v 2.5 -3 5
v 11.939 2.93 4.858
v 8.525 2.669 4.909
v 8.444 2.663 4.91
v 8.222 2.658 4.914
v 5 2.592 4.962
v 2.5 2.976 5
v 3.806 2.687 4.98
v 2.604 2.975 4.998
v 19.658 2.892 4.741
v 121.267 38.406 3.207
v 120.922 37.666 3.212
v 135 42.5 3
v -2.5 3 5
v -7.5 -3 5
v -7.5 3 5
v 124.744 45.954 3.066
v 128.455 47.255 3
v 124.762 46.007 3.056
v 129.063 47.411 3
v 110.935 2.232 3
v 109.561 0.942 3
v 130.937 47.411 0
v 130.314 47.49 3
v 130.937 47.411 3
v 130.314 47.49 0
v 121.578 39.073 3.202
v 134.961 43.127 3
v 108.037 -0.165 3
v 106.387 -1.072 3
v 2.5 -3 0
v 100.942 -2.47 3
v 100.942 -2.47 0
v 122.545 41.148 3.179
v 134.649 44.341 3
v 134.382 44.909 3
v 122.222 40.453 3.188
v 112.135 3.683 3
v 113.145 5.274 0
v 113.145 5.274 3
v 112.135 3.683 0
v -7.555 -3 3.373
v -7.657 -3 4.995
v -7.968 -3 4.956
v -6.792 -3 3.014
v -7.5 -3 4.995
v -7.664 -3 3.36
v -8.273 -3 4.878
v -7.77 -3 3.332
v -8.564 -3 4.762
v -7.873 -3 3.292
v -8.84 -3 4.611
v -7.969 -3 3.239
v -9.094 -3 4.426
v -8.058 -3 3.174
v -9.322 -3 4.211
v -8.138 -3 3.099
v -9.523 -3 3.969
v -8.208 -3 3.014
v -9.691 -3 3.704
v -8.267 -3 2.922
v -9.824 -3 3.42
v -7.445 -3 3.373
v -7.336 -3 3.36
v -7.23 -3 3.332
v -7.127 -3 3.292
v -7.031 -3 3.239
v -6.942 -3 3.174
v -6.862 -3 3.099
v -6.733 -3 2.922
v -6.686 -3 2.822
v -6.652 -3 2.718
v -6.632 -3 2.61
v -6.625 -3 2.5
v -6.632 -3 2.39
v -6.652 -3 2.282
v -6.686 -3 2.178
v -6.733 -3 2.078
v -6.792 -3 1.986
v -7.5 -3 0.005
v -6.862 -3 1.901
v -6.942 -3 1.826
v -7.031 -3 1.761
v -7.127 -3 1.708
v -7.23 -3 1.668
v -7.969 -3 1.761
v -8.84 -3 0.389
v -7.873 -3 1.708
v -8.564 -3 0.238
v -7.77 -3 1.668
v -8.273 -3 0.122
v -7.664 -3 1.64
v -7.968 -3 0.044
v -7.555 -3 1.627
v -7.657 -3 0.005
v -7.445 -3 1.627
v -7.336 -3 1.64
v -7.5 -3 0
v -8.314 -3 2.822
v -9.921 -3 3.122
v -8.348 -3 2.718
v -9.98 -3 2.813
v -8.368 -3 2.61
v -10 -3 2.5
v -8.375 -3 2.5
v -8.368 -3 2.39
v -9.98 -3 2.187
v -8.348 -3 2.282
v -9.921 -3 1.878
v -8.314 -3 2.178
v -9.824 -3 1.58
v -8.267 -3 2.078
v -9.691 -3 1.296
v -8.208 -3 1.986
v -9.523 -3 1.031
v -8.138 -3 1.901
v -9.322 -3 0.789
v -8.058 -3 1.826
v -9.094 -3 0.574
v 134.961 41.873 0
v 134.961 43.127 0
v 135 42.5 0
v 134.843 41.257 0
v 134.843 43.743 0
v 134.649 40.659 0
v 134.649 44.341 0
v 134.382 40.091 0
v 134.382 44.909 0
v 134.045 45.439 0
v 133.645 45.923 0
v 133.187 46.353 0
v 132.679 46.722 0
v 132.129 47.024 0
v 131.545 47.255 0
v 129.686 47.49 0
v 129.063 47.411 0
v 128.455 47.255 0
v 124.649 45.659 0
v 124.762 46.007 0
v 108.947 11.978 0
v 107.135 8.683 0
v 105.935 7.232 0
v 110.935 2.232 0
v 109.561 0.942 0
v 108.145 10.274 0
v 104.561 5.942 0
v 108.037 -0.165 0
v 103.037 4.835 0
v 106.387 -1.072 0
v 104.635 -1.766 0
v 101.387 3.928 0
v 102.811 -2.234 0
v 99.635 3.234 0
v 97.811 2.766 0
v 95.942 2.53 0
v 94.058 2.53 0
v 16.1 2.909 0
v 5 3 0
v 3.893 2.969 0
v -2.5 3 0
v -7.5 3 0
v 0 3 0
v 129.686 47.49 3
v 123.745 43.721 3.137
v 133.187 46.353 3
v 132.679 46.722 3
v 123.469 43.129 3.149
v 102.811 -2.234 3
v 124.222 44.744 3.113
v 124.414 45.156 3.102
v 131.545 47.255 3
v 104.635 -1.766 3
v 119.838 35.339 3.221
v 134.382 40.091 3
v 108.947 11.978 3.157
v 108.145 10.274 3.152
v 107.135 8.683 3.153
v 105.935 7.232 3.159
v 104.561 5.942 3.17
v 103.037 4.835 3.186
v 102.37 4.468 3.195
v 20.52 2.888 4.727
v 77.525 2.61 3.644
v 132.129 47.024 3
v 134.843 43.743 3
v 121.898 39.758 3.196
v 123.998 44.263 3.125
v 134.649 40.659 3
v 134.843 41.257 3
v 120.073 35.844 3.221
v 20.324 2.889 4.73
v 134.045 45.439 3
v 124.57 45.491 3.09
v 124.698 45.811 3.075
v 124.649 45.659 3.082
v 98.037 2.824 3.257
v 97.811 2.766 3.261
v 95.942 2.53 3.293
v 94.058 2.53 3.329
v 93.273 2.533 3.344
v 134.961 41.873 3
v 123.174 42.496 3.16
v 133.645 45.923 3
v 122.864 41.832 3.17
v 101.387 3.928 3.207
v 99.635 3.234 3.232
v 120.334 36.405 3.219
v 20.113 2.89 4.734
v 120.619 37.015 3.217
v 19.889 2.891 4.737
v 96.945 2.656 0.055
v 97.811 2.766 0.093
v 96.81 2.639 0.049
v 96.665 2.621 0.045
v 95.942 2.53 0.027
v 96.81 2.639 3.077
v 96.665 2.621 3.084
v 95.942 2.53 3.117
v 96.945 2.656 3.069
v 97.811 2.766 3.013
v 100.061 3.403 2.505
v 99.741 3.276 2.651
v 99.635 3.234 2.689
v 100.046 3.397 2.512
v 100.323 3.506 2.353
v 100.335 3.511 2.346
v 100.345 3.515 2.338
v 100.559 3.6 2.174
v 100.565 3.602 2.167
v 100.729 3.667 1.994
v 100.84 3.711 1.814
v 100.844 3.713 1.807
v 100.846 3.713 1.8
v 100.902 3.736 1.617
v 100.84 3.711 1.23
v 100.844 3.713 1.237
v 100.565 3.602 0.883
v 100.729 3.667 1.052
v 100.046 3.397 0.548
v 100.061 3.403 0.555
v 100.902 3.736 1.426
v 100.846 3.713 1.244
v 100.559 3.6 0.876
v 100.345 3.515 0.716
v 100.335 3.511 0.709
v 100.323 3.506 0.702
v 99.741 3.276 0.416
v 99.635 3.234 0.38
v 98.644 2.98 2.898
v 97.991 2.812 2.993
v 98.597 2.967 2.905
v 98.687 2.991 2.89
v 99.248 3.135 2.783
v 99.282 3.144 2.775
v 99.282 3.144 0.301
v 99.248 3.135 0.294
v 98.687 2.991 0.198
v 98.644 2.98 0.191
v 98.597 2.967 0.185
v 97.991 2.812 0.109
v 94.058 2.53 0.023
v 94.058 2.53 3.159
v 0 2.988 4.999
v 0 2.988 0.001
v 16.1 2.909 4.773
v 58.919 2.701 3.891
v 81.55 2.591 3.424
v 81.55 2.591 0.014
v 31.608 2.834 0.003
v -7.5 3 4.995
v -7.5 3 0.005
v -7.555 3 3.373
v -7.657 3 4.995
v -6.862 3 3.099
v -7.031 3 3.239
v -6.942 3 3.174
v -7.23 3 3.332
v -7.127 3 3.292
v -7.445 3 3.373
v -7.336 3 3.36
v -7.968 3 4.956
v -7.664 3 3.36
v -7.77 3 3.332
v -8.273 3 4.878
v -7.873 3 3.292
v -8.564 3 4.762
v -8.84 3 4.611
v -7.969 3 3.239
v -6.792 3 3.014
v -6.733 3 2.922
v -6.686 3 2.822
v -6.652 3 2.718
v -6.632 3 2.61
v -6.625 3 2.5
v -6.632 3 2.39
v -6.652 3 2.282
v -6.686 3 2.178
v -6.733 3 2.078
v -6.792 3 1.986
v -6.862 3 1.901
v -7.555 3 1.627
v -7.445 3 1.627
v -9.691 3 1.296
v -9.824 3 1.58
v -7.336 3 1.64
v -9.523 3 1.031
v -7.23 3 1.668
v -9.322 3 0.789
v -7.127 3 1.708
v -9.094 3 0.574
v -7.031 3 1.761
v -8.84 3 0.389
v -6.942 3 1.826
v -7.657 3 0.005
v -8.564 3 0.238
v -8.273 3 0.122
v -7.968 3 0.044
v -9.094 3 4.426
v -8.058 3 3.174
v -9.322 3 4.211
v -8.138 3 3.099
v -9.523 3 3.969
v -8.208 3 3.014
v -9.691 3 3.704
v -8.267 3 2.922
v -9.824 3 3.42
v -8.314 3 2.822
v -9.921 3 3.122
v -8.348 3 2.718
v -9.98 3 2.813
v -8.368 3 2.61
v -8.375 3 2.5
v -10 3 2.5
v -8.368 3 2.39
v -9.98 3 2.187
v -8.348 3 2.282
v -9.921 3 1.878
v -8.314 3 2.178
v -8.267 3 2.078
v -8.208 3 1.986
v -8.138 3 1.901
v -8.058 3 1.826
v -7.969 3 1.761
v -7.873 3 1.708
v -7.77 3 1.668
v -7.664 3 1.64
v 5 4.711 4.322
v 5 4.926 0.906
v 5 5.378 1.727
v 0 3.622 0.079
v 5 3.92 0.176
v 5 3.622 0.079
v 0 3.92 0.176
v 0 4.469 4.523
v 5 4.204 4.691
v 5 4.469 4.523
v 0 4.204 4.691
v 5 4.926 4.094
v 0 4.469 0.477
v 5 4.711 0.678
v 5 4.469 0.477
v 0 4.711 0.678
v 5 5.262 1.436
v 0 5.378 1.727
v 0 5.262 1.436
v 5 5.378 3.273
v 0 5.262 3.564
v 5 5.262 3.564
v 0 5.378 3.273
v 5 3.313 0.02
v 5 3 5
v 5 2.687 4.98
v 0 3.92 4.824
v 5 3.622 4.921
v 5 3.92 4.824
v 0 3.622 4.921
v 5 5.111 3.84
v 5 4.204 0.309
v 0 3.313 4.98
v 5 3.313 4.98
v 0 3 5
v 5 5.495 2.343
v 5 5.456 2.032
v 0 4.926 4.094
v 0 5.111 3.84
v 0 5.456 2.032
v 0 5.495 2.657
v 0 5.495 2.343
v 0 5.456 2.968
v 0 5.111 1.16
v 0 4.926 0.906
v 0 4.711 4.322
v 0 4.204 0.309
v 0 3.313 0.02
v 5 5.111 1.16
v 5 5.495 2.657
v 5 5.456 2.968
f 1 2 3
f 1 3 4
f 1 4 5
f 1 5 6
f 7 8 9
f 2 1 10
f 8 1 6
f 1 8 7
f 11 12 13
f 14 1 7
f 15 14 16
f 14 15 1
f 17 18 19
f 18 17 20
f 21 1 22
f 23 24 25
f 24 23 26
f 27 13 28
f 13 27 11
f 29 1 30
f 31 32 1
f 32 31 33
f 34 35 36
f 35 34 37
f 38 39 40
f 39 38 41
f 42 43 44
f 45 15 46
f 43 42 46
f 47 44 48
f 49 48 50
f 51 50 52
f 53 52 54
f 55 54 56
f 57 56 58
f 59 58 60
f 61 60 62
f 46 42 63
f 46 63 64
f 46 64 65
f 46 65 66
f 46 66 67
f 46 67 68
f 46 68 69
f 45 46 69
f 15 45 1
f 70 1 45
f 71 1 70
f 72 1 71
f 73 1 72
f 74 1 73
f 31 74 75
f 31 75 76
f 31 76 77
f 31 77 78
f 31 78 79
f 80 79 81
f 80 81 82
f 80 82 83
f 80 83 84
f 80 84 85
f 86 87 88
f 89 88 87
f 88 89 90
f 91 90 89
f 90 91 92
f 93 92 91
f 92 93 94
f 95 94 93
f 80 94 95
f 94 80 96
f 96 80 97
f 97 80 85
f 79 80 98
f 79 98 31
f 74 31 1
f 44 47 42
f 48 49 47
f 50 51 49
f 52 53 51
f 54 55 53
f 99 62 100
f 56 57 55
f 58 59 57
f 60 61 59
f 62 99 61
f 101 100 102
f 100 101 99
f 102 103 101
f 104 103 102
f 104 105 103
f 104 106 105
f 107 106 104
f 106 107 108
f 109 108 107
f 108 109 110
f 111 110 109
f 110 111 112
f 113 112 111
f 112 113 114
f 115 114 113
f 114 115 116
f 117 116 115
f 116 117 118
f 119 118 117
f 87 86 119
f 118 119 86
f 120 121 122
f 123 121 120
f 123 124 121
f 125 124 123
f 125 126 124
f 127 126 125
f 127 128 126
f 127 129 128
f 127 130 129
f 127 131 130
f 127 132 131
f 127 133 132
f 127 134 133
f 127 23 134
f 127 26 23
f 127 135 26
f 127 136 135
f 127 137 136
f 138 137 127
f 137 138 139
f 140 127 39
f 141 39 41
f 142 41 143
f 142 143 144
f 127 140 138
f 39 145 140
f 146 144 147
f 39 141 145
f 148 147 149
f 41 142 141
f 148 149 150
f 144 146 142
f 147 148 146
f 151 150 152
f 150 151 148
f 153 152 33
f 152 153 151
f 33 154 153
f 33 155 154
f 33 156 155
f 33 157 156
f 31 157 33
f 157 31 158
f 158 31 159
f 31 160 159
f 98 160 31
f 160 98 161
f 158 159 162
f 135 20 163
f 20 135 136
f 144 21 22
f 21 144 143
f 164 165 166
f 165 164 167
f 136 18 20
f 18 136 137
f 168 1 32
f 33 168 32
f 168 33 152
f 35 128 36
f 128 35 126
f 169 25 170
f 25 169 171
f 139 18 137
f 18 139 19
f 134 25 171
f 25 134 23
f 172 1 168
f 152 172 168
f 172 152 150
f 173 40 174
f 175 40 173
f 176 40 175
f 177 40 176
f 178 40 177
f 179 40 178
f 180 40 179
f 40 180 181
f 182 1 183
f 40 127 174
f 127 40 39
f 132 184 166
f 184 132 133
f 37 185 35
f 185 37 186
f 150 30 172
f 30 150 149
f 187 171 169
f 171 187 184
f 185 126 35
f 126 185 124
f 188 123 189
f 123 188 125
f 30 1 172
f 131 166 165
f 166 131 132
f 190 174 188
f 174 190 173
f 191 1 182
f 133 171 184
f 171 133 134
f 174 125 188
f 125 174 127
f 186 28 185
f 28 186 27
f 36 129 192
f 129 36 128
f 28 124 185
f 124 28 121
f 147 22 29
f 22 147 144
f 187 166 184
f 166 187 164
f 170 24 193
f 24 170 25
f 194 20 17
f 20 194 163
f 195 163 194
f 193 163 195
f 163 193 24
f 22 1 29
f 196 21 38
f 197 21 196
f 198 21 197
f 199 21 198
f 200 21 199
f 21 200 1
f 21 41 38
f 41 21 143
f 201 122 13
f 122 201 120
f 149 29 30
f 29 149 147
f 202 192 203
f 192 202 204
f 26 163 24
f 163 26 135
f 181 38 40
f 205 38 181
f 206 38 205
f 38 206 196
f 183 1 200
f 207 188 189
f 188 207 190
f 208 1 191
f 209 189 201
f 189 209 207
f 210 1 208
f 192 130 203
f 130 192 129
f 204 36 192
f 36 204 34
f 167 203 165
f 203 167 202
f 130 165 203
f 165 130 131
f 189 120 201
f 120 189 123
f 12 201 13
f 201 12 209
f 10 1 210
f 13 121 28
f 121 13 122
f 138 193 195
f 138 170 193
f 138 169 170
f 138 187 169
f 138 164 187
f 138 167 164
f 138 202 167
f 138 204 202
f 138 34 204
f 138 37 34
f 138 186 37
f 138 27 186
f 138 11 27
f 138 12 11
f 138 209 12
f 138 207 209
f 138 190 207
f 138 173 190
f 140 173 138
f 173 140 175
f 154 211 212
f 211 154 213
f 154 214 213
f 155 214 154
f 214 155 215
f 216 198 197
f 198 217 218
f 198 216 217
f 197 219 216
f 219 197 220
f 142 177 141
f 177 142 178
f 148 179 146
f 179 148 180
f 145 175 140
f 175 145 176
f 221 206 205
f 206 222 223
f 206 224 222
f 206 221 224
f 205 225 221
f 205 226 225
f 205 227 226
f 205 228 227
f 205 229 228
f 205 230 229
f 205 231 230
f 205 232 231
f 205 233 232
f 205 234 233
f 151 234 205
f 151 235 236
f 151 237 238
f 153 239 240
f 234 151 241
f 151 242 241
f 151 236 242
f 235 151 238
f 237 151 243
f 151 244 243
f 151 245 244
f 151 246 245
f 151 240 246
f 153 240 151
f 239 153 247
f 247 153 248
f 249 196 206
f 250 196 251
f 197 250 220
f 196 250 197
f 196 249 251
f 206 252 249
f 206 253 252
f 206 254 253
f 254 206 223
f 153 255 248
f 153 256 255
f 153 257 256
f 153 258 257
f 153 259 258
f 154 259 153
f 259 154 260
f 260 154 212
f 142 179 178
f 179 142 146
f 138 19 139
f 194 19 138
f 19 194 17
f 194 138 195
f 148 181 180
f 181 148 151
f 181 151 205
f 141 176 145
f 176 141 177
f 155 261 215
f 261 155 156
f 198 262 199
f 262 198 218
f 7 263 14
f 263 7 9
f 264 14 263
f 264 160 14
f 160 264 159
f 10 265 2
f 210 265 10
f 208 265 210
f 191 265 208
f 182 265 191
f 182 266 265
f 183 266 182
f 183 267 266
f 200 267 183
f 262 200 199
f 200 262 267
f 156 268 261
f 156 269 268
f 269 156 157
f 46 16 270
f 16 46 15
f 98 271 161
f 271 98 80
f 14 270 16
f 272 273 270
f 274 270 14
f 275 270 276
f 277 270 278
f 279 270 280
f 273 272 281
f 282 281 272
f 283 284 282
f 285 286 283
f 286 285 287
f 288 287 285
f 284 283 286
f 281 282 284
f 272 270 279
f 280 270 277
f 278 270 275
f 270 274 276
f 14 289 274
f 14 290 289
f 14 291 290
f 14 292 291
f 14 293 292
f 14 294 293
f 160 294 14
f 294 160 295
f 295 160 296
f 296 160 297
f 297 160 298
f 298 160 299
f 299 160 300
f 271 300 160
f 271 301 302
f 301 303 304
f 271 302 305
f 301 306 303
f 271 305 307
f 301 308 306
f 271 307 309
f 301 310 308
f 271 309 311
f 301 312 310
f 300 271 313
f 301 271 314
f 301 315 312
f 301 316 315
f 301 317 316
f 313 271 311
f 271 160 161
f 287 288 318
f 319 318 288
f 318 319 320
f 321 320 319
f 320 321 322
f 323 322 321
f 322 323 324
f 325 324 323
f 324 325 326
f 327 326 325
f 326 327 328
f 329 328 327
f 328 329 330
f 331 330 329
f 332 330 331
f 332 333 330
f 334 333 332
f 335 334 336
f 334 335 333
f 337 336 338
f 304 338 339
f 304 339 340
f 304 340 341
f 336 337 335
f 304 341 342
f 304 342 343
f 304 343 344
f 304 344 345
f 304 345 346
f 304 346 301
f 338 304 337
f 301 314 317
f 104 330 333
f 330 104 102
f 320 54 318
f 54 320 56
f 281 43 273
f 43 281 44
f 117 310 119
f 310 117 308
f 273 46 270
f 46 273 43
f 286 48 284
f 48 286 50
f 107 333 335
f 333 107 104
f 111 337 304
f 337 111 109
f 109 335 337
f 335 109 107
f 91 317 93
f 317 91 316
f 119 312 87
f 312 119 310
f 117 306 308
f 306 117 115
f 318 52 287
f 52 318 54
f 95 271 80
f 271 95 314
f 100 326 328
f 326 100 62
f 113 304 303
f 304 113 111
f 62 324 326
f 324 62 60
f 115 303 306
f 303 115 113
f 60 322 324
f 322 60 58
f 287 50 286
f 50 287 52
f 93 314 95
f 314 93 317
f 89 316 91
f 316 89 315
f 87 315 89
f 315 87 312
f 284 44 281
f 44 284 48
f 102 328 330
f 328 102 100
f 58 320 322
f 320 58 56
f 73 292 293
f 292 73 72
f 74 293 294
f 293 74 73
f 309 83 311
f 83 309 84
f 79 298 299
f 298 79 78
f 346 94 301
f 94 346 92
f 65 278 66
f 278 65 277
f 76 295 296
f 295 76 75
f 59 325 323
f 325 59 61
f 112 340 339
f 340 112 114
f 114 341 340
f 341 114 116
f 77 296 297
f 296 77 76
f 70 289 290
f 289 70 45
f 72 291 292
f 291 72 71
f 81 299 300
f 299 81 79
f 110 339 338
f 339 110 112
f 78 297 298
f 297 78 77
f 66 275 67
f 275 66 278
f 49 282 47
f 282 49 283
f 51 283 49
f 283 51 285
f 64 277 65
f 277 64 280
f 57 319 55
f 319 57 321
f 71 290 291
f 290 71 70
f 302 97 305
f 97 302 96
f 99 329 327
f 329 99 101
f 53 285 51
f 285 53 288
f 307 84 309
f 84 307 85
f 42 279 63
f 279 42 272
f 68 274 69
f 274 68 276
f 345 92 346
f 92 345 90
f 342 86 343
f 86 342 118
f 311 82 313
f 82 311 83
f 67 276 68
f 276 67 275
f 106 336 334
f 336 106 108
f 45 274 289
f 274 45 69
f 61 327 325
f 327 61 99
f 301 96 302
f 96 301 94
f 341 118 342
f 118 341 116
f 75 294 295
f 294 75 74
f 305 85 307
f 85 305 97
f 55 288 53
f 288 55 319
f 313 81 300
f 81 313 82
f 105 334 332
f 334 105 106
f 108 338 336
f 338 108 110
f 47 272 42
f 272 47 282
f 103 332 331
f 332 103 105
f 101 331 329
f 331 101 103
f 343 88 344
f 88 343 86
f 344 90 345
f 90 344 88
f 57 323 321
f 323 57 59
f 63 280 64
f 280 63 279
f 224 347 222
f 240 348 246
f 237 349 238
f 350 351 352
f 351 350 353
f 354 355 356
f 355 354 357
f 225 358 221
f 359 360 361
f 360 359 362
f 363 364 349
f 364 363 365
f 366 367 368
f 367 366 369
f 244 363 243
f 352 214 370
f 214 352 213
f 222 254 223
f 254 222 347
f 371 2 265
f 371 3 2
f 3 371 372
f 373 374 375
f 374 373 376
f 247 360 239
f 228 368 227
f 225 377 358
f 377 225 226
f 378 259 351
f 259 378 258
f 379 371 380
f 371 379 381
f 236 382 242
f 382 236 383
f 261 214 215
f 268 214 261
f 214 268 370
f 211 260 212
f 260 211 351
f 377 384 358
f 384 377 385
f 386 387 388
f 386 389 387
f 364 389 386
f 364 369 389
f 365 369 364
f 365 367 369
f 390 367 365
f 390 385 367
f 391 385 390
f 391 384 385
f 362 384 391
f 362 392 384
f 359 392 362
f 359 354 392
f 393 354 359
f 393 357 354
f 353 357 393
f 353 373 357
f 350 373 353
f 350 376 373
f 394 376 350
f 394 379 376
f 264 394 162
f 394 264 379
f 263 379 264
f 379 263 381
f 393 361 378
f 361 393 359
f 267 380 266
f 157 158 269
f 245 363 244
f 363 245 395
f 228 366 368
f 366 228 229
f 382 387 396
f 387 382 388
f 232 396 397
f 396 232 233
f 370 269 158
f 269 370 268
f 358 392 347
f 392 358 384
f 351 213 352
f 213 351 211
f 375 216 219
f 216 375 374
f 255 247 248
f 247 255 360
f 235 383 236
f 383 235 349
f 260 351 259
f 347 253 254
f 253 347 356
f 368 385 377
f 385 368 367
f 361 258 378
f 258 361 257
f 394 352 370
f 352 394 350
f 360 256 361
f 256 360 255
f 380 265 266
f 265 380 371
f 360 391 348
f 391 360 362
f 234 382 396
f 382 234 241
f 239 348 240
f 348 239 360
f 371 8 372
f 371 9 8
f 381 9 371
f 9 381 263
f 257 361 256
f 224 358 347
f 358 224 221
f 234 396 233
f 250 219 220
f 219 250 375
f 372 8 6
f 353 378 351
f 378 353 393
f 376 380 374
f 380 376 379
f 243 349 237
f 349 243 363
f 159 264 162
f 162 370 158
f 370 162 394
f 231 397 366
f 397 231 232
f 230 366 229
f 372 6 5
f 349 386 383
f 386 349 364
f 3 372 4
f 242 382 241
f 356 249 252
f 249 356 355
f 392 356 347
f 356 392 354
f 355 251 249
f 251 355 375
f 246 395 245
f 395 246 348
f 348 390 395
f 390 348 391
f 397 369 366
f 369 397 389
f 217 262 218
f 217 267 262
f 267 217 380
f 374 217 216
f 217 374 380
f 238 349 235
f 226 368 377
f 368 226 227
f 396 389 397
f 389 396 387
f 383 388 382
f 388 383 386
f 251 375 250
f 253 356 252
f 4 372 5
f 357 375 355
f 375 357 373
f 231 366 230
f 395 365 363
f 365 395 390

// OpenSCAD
Stem_Length=100;
Stem_Width=5;
Stem_Thickness=3;
Stem_Curve_Length=30;
Hinge_Pin_Diameter=1.75;
Hinge_Width=6;
Hinge_Length=5;
Hinge_Thickness=5;
Slider_Thickness=4;
Tube_Diameter=11;
Tube_Inner_Diameter=8;
Tube_Compressed_Thickness=1.2;
Tube_Compressed_Width=18;
Tube_Holder_Wall_Thickness=3;
Outlet_Tube_Inner_Diameter=3;
$fn=50;


//Plug();

//End_Cap();

//Slider();

Stem();

//Tube_Holder();

module Complete_Syringe(){
translate([30,(Tube_Diameter/3+Tube_Holder_Wall_Thickness),(Tube_Diameter/3+Tube_Holder_Wall_Thickness)])
rotate([90,0,90])
Slider();

translate([0,(Tube_Diameter/3+Tube_Holder_Wall_Thickness),(Tube_Diameter/3+Tube_Holder_Wall_Thickness)])
rotate([90,0,90])
End_Thing();

translate([0,Tube_Diameter/2+Tube_Holder_Wall_Thickness-2,Tube_Diameter/2+Tube_Holder_Wall_Thickness-2])rotate([0,0,90])Tube_Holder();

}


module End_Stop_Plug(){

difference(){

	union(){

		cylinder(2.5, Tube_Inner_Diameter/2+.5, Tube_Inner_Diameter/2+1);

		translate([0,0,2.5])
			cylinder(2.5, Tube_Inner_Diameter/2+.5, Tube_Inner_Diameter/2+1);
	}

	translate([Tube_Inner_Diameter/2+1,0,-1])
		cylinder(7, 1.5, 1.5);

	translate([Tube_Inner_Diameter/-2-1,0,-1])
		cylinder(7, 1.5, 1.5);

}

}
module End_Cap(){

difference(){

	cylinder(5, Tube_Diameter/2+Tube_Holder_Wall_Thickness*2, Tube_Diameter/2+Tube_Holder_Wall_Thickness*2);

	difference(){	
	
		translate([0,0,-1])		
			cylinder(7, Tube_Diameter/2+Tube_Holder_Wall_Thickness, Tube_Diameter/2+Tube_Holder_Wall_Thickness);

		hull(){
		
			translate([0,(Tube_Compressed_Thickness/-2+-Slider_Thickness)+Tube_Diameter,(Tube_Diameter+Tube_Holder_Wall_Thickness*2+2)/-2])
				cylinder(Tube_Diameter+Tube_Holder_Wall_Thickness*2+2, Tube_Compressed_Thickness/2+Slider_Thickness-.5, Tube_Compressed_Thickness/2+Slider_Thickness-.5);

			translate([0,(Tube_Compressed_Thickness/2+Slider_Thickness)-Tube_Diameter,(Tube_Diameter+Tube_Holder_Wall_Thickness*2+2)/-2])


				cylinder(Tube_Diameter+Tube_Holder_Wall_Thickness*2+2-.5, Tube_Compressed_Thickness/2+Slider_Thickness, Tube_Compressed_Thickness/2+Slider_Thickness-.5);

		} 

	}

	translate([0,0,-1])
		cylinder(7,Tube_Diameter/2+1, Tube_Diameter/2+1);
		
}

	translate([0,0,3])
		rotate([0,0,0])
			rotate_extrude(convexity = 10)
				translate([Tube_Diameter/2+Tube_Holder_Wall_Thickness, 0, 0])
					circle(r = .5, $fn = 100);

}

module Plug(){

difference(){

	union(){

		cylinder(2.5, Tube_Inner_Diameter/2+.5, Tube_Inner_Diameter/2+1.25);

		translate([0,0,2.5])
			cylinder(2.5, Tube_Inner_Diameter/2+.5, Tube_Inner_Diameter/2+1.25);

		translate([0,0,5])
			cylinder(2.5, Outlet_Tube_Inner_Diameter/2+1, Outlet_Tube_Inner_Diameter/2+.5);

		translate([0,0,7.5])
			cylinder(2.5, Outlet_Tube_Inner_Diameter/2+1, Outlet_Tube_Inner_Diameter/2+.5);

}

	translate([0,0,-1])
		cylinder(12,Outlet_Tube_Inner_Diameter/2-.5,Outlet_Tube_Inner_Diameter/2-.5);

	translate([0,0,-1])
		cylinder(6, Tube_Inner_Diameter/2-.5, Outlet_Tube_Inner_Diameter/2-.5);

}
}

module Slider()
{
scale([1.05,1.05,1])
difference()
	{

	cylinder(h = Slider_Thickness, r = Tube_Diameter/2+Tube_Holder_Wall_Thickness+Slider_Thickness);

	translate([0,0,-1])
		cylinder(h = Slider_Thickness+2, r = Tube_Diameter/2+Tube_Holder_Wall_Thickness);
	}

hull()
	{

	translate([Tube_Compressed_Thickness+Slider_Thickness/4,
				 Tube_Diameter/2+Tube_Holder_Wall_Thickness+1, 
				 Slider_Thickness/4])
		rotate([90,0,0])
			cylinder(h = Tube_Diameter+Tube_Holder_Wall_Thickness*2+2, r = Slider_Thickness/4); 

	translate([Tube_Compressed_Thickness+Slider_Thickness/4,
				 Tube_Diameter/2+Tube_Holder_Wall_Thickness+1, 
				 Slider_Thickness-(Slider_Thickness/4)])
		rotate([90,0,0])
			cylinder(h = Tube_Diameter+Tube_Holder_Wall_Thickness*2+2, r = Slider_Thickness/4); 
	}

hull()
	{
	translate([-Tube_Compressed_Thickness+Slider_Thickness/-4,
				 Tube_Diameter/2+Tube_Holder_Wall_Thickness+1, 
				 Slider_Thickness/4])
		rotate([90,0,0])
			cylinder(h = Tube_Diameter+Tube_Holder_Wall_Thickness*2+2, r = Slider_Thickness/4); 

	translate([-Tube_Compressed_Thickness+Slider_Thickness/-4,
				 Tube_Diameter/2+Tube_Holder_Wall_Thickness+1, 
				 Slider_Thickness-(Slider_Thickness/4)])
		rotate([90,0,0])
			cylinder(h = Tube_Diameter+Tube_Holder_Wall_Thickness*2+2, r = Slider_Thickness/4); 
	}

}

module Tube_Holder(){

difference(){

	rotate([90,0,0])
		cylinder(Stem_Length, Tube_Diameter/2+Tube_Holder_Wall_Thickness, Tube_Diameter/2+Tube_Holder_Wall_Thickness);

	translate([0,1,0])
		rotate([90,0,0])
			cylinder(Stem_Length+2, Tube_Diameter/2, Tube_Diameter/2);

	translate([0,1,0])
		rotate([90,0,0])
			cylinder(h = 6, r = Tube_Diameter/2+.5);


	translate([0, Stem_Length/-2,(Tube_Diameter+Tube_Holder_Wall_Thickness*2)/-1+2])
		cube([ Tube_Diameter+Tube_Holder_Wall_Thickness*2+2,
				Stem_Length+2,
				Tube_Diameter+Tube_Holder_Wall_Thickness*2], 
				center = true);

	hull(){
		
		translate([0,0,(Tube_Diameter+Tube_Holder_Wall_Thickness*2+2)/-2])
			cylinder( h = Tube_Diameter+Tube_Holder_Wall_Thickness*2+2, 
						r = Tube_Compressed_Thickness/2+Slider_Thickness);

		translate([0,
					(Tube_Compressed_Thickness/2+Slider_Thickness)-Stem_Length+Tube_Holder_Wall_Thickness,						(Tube_Diameter+Tube_Holder_Wall_Thickness*2+2)/-2])
			cylinder( h = Tube_Diameter+Tube_Holder_Wall_Thickness*2+2, 
						r = Tube_Compressed_Thickness/2+Slider_Thickness);
			} 

	translate([0,-3,0])
		rotate([90,0,0])
			rotate_extrude(convexity = 10)
				translate([Tube_Diameter/2+Tube_Holder_Wall_Thickness, 0, 0])
					circle(r = 1, $fn = 100);


}

}


module Stem()
{
hull()
{
translate([0,3,2.5])
rotate([0,90,0])
cylinder(h = Stem_Width, r = Hinge_Thickness/2);
translate([Stem_Length,2.2,1.5])
rotate([0,90,0])
cylinder(h = Stem_Thickness, r = (Stem_Thickness)/2);
}
difference()
	{
hull()
		{

	translate([0,0,Hinge_Thickness/2])
		cube([Stem_Width, Hinge_Width, Hinge_Thickness], center = true);

	translate([Stem_Length,Stem_Width*2.5,0])
		cylinder(h = Stem_Thickness, r = Stem_Width*3);

	translate([Stem_Length+Stem_Curve_Length,Stem_Width*2.5+Stem_Curve_Length,0])
		cylinder(h = Stem_Thickness, r = Stem_Width);
		}


translate([0,Stem_Width,0])
hull()
		{
	translate([0,Hinge_Width/2-Stem_Width/2,(Hinge_Thickness+1)/2])
		cube([Stem_Width, Stem_Width, Hinge_Thickness+2], center = true);

	translate([Stem_Length-Stem_Width,Stem_Width*2.5,-1])
		cylinder(Stem_Thickness+2, Stem_Width*3, Stem_Width*3);

	translate([Stem_Length+Stem_Curve_Length-Stem_Width*2,Stem_Width*2.5+Stem_Curve_Length,-1])
		cylinder(Stem_Thickness+2, Stem_Width, Stem_Width);
		}
	}

difference()
	{
	union()
		{
		translate([-Hinge_Length,0,Hinge_Thickness/2])
			cube([Hinge_Length, Hinge_Width, Hinge_Thickness], center = true);

		translate([-Hinge_Length-Hinge_Thickness/2,(Hinge_Width)/2,Hinge_Thickness/2])	
rotate([90,0,0])
			#cylinder(h = Hinge_Width, r = Hinge_Thickness/2);
		}
		

	translate([-Hinge_Length-Hinge_Thickness/2,(Hinge_Width+2)/2,Hinge_Thickness/2])	
		rotate([90,0,0])
			cylinder(h = Hinge_Width+2, r = Hinge_Pin_Diameter/2);
	}	

}
